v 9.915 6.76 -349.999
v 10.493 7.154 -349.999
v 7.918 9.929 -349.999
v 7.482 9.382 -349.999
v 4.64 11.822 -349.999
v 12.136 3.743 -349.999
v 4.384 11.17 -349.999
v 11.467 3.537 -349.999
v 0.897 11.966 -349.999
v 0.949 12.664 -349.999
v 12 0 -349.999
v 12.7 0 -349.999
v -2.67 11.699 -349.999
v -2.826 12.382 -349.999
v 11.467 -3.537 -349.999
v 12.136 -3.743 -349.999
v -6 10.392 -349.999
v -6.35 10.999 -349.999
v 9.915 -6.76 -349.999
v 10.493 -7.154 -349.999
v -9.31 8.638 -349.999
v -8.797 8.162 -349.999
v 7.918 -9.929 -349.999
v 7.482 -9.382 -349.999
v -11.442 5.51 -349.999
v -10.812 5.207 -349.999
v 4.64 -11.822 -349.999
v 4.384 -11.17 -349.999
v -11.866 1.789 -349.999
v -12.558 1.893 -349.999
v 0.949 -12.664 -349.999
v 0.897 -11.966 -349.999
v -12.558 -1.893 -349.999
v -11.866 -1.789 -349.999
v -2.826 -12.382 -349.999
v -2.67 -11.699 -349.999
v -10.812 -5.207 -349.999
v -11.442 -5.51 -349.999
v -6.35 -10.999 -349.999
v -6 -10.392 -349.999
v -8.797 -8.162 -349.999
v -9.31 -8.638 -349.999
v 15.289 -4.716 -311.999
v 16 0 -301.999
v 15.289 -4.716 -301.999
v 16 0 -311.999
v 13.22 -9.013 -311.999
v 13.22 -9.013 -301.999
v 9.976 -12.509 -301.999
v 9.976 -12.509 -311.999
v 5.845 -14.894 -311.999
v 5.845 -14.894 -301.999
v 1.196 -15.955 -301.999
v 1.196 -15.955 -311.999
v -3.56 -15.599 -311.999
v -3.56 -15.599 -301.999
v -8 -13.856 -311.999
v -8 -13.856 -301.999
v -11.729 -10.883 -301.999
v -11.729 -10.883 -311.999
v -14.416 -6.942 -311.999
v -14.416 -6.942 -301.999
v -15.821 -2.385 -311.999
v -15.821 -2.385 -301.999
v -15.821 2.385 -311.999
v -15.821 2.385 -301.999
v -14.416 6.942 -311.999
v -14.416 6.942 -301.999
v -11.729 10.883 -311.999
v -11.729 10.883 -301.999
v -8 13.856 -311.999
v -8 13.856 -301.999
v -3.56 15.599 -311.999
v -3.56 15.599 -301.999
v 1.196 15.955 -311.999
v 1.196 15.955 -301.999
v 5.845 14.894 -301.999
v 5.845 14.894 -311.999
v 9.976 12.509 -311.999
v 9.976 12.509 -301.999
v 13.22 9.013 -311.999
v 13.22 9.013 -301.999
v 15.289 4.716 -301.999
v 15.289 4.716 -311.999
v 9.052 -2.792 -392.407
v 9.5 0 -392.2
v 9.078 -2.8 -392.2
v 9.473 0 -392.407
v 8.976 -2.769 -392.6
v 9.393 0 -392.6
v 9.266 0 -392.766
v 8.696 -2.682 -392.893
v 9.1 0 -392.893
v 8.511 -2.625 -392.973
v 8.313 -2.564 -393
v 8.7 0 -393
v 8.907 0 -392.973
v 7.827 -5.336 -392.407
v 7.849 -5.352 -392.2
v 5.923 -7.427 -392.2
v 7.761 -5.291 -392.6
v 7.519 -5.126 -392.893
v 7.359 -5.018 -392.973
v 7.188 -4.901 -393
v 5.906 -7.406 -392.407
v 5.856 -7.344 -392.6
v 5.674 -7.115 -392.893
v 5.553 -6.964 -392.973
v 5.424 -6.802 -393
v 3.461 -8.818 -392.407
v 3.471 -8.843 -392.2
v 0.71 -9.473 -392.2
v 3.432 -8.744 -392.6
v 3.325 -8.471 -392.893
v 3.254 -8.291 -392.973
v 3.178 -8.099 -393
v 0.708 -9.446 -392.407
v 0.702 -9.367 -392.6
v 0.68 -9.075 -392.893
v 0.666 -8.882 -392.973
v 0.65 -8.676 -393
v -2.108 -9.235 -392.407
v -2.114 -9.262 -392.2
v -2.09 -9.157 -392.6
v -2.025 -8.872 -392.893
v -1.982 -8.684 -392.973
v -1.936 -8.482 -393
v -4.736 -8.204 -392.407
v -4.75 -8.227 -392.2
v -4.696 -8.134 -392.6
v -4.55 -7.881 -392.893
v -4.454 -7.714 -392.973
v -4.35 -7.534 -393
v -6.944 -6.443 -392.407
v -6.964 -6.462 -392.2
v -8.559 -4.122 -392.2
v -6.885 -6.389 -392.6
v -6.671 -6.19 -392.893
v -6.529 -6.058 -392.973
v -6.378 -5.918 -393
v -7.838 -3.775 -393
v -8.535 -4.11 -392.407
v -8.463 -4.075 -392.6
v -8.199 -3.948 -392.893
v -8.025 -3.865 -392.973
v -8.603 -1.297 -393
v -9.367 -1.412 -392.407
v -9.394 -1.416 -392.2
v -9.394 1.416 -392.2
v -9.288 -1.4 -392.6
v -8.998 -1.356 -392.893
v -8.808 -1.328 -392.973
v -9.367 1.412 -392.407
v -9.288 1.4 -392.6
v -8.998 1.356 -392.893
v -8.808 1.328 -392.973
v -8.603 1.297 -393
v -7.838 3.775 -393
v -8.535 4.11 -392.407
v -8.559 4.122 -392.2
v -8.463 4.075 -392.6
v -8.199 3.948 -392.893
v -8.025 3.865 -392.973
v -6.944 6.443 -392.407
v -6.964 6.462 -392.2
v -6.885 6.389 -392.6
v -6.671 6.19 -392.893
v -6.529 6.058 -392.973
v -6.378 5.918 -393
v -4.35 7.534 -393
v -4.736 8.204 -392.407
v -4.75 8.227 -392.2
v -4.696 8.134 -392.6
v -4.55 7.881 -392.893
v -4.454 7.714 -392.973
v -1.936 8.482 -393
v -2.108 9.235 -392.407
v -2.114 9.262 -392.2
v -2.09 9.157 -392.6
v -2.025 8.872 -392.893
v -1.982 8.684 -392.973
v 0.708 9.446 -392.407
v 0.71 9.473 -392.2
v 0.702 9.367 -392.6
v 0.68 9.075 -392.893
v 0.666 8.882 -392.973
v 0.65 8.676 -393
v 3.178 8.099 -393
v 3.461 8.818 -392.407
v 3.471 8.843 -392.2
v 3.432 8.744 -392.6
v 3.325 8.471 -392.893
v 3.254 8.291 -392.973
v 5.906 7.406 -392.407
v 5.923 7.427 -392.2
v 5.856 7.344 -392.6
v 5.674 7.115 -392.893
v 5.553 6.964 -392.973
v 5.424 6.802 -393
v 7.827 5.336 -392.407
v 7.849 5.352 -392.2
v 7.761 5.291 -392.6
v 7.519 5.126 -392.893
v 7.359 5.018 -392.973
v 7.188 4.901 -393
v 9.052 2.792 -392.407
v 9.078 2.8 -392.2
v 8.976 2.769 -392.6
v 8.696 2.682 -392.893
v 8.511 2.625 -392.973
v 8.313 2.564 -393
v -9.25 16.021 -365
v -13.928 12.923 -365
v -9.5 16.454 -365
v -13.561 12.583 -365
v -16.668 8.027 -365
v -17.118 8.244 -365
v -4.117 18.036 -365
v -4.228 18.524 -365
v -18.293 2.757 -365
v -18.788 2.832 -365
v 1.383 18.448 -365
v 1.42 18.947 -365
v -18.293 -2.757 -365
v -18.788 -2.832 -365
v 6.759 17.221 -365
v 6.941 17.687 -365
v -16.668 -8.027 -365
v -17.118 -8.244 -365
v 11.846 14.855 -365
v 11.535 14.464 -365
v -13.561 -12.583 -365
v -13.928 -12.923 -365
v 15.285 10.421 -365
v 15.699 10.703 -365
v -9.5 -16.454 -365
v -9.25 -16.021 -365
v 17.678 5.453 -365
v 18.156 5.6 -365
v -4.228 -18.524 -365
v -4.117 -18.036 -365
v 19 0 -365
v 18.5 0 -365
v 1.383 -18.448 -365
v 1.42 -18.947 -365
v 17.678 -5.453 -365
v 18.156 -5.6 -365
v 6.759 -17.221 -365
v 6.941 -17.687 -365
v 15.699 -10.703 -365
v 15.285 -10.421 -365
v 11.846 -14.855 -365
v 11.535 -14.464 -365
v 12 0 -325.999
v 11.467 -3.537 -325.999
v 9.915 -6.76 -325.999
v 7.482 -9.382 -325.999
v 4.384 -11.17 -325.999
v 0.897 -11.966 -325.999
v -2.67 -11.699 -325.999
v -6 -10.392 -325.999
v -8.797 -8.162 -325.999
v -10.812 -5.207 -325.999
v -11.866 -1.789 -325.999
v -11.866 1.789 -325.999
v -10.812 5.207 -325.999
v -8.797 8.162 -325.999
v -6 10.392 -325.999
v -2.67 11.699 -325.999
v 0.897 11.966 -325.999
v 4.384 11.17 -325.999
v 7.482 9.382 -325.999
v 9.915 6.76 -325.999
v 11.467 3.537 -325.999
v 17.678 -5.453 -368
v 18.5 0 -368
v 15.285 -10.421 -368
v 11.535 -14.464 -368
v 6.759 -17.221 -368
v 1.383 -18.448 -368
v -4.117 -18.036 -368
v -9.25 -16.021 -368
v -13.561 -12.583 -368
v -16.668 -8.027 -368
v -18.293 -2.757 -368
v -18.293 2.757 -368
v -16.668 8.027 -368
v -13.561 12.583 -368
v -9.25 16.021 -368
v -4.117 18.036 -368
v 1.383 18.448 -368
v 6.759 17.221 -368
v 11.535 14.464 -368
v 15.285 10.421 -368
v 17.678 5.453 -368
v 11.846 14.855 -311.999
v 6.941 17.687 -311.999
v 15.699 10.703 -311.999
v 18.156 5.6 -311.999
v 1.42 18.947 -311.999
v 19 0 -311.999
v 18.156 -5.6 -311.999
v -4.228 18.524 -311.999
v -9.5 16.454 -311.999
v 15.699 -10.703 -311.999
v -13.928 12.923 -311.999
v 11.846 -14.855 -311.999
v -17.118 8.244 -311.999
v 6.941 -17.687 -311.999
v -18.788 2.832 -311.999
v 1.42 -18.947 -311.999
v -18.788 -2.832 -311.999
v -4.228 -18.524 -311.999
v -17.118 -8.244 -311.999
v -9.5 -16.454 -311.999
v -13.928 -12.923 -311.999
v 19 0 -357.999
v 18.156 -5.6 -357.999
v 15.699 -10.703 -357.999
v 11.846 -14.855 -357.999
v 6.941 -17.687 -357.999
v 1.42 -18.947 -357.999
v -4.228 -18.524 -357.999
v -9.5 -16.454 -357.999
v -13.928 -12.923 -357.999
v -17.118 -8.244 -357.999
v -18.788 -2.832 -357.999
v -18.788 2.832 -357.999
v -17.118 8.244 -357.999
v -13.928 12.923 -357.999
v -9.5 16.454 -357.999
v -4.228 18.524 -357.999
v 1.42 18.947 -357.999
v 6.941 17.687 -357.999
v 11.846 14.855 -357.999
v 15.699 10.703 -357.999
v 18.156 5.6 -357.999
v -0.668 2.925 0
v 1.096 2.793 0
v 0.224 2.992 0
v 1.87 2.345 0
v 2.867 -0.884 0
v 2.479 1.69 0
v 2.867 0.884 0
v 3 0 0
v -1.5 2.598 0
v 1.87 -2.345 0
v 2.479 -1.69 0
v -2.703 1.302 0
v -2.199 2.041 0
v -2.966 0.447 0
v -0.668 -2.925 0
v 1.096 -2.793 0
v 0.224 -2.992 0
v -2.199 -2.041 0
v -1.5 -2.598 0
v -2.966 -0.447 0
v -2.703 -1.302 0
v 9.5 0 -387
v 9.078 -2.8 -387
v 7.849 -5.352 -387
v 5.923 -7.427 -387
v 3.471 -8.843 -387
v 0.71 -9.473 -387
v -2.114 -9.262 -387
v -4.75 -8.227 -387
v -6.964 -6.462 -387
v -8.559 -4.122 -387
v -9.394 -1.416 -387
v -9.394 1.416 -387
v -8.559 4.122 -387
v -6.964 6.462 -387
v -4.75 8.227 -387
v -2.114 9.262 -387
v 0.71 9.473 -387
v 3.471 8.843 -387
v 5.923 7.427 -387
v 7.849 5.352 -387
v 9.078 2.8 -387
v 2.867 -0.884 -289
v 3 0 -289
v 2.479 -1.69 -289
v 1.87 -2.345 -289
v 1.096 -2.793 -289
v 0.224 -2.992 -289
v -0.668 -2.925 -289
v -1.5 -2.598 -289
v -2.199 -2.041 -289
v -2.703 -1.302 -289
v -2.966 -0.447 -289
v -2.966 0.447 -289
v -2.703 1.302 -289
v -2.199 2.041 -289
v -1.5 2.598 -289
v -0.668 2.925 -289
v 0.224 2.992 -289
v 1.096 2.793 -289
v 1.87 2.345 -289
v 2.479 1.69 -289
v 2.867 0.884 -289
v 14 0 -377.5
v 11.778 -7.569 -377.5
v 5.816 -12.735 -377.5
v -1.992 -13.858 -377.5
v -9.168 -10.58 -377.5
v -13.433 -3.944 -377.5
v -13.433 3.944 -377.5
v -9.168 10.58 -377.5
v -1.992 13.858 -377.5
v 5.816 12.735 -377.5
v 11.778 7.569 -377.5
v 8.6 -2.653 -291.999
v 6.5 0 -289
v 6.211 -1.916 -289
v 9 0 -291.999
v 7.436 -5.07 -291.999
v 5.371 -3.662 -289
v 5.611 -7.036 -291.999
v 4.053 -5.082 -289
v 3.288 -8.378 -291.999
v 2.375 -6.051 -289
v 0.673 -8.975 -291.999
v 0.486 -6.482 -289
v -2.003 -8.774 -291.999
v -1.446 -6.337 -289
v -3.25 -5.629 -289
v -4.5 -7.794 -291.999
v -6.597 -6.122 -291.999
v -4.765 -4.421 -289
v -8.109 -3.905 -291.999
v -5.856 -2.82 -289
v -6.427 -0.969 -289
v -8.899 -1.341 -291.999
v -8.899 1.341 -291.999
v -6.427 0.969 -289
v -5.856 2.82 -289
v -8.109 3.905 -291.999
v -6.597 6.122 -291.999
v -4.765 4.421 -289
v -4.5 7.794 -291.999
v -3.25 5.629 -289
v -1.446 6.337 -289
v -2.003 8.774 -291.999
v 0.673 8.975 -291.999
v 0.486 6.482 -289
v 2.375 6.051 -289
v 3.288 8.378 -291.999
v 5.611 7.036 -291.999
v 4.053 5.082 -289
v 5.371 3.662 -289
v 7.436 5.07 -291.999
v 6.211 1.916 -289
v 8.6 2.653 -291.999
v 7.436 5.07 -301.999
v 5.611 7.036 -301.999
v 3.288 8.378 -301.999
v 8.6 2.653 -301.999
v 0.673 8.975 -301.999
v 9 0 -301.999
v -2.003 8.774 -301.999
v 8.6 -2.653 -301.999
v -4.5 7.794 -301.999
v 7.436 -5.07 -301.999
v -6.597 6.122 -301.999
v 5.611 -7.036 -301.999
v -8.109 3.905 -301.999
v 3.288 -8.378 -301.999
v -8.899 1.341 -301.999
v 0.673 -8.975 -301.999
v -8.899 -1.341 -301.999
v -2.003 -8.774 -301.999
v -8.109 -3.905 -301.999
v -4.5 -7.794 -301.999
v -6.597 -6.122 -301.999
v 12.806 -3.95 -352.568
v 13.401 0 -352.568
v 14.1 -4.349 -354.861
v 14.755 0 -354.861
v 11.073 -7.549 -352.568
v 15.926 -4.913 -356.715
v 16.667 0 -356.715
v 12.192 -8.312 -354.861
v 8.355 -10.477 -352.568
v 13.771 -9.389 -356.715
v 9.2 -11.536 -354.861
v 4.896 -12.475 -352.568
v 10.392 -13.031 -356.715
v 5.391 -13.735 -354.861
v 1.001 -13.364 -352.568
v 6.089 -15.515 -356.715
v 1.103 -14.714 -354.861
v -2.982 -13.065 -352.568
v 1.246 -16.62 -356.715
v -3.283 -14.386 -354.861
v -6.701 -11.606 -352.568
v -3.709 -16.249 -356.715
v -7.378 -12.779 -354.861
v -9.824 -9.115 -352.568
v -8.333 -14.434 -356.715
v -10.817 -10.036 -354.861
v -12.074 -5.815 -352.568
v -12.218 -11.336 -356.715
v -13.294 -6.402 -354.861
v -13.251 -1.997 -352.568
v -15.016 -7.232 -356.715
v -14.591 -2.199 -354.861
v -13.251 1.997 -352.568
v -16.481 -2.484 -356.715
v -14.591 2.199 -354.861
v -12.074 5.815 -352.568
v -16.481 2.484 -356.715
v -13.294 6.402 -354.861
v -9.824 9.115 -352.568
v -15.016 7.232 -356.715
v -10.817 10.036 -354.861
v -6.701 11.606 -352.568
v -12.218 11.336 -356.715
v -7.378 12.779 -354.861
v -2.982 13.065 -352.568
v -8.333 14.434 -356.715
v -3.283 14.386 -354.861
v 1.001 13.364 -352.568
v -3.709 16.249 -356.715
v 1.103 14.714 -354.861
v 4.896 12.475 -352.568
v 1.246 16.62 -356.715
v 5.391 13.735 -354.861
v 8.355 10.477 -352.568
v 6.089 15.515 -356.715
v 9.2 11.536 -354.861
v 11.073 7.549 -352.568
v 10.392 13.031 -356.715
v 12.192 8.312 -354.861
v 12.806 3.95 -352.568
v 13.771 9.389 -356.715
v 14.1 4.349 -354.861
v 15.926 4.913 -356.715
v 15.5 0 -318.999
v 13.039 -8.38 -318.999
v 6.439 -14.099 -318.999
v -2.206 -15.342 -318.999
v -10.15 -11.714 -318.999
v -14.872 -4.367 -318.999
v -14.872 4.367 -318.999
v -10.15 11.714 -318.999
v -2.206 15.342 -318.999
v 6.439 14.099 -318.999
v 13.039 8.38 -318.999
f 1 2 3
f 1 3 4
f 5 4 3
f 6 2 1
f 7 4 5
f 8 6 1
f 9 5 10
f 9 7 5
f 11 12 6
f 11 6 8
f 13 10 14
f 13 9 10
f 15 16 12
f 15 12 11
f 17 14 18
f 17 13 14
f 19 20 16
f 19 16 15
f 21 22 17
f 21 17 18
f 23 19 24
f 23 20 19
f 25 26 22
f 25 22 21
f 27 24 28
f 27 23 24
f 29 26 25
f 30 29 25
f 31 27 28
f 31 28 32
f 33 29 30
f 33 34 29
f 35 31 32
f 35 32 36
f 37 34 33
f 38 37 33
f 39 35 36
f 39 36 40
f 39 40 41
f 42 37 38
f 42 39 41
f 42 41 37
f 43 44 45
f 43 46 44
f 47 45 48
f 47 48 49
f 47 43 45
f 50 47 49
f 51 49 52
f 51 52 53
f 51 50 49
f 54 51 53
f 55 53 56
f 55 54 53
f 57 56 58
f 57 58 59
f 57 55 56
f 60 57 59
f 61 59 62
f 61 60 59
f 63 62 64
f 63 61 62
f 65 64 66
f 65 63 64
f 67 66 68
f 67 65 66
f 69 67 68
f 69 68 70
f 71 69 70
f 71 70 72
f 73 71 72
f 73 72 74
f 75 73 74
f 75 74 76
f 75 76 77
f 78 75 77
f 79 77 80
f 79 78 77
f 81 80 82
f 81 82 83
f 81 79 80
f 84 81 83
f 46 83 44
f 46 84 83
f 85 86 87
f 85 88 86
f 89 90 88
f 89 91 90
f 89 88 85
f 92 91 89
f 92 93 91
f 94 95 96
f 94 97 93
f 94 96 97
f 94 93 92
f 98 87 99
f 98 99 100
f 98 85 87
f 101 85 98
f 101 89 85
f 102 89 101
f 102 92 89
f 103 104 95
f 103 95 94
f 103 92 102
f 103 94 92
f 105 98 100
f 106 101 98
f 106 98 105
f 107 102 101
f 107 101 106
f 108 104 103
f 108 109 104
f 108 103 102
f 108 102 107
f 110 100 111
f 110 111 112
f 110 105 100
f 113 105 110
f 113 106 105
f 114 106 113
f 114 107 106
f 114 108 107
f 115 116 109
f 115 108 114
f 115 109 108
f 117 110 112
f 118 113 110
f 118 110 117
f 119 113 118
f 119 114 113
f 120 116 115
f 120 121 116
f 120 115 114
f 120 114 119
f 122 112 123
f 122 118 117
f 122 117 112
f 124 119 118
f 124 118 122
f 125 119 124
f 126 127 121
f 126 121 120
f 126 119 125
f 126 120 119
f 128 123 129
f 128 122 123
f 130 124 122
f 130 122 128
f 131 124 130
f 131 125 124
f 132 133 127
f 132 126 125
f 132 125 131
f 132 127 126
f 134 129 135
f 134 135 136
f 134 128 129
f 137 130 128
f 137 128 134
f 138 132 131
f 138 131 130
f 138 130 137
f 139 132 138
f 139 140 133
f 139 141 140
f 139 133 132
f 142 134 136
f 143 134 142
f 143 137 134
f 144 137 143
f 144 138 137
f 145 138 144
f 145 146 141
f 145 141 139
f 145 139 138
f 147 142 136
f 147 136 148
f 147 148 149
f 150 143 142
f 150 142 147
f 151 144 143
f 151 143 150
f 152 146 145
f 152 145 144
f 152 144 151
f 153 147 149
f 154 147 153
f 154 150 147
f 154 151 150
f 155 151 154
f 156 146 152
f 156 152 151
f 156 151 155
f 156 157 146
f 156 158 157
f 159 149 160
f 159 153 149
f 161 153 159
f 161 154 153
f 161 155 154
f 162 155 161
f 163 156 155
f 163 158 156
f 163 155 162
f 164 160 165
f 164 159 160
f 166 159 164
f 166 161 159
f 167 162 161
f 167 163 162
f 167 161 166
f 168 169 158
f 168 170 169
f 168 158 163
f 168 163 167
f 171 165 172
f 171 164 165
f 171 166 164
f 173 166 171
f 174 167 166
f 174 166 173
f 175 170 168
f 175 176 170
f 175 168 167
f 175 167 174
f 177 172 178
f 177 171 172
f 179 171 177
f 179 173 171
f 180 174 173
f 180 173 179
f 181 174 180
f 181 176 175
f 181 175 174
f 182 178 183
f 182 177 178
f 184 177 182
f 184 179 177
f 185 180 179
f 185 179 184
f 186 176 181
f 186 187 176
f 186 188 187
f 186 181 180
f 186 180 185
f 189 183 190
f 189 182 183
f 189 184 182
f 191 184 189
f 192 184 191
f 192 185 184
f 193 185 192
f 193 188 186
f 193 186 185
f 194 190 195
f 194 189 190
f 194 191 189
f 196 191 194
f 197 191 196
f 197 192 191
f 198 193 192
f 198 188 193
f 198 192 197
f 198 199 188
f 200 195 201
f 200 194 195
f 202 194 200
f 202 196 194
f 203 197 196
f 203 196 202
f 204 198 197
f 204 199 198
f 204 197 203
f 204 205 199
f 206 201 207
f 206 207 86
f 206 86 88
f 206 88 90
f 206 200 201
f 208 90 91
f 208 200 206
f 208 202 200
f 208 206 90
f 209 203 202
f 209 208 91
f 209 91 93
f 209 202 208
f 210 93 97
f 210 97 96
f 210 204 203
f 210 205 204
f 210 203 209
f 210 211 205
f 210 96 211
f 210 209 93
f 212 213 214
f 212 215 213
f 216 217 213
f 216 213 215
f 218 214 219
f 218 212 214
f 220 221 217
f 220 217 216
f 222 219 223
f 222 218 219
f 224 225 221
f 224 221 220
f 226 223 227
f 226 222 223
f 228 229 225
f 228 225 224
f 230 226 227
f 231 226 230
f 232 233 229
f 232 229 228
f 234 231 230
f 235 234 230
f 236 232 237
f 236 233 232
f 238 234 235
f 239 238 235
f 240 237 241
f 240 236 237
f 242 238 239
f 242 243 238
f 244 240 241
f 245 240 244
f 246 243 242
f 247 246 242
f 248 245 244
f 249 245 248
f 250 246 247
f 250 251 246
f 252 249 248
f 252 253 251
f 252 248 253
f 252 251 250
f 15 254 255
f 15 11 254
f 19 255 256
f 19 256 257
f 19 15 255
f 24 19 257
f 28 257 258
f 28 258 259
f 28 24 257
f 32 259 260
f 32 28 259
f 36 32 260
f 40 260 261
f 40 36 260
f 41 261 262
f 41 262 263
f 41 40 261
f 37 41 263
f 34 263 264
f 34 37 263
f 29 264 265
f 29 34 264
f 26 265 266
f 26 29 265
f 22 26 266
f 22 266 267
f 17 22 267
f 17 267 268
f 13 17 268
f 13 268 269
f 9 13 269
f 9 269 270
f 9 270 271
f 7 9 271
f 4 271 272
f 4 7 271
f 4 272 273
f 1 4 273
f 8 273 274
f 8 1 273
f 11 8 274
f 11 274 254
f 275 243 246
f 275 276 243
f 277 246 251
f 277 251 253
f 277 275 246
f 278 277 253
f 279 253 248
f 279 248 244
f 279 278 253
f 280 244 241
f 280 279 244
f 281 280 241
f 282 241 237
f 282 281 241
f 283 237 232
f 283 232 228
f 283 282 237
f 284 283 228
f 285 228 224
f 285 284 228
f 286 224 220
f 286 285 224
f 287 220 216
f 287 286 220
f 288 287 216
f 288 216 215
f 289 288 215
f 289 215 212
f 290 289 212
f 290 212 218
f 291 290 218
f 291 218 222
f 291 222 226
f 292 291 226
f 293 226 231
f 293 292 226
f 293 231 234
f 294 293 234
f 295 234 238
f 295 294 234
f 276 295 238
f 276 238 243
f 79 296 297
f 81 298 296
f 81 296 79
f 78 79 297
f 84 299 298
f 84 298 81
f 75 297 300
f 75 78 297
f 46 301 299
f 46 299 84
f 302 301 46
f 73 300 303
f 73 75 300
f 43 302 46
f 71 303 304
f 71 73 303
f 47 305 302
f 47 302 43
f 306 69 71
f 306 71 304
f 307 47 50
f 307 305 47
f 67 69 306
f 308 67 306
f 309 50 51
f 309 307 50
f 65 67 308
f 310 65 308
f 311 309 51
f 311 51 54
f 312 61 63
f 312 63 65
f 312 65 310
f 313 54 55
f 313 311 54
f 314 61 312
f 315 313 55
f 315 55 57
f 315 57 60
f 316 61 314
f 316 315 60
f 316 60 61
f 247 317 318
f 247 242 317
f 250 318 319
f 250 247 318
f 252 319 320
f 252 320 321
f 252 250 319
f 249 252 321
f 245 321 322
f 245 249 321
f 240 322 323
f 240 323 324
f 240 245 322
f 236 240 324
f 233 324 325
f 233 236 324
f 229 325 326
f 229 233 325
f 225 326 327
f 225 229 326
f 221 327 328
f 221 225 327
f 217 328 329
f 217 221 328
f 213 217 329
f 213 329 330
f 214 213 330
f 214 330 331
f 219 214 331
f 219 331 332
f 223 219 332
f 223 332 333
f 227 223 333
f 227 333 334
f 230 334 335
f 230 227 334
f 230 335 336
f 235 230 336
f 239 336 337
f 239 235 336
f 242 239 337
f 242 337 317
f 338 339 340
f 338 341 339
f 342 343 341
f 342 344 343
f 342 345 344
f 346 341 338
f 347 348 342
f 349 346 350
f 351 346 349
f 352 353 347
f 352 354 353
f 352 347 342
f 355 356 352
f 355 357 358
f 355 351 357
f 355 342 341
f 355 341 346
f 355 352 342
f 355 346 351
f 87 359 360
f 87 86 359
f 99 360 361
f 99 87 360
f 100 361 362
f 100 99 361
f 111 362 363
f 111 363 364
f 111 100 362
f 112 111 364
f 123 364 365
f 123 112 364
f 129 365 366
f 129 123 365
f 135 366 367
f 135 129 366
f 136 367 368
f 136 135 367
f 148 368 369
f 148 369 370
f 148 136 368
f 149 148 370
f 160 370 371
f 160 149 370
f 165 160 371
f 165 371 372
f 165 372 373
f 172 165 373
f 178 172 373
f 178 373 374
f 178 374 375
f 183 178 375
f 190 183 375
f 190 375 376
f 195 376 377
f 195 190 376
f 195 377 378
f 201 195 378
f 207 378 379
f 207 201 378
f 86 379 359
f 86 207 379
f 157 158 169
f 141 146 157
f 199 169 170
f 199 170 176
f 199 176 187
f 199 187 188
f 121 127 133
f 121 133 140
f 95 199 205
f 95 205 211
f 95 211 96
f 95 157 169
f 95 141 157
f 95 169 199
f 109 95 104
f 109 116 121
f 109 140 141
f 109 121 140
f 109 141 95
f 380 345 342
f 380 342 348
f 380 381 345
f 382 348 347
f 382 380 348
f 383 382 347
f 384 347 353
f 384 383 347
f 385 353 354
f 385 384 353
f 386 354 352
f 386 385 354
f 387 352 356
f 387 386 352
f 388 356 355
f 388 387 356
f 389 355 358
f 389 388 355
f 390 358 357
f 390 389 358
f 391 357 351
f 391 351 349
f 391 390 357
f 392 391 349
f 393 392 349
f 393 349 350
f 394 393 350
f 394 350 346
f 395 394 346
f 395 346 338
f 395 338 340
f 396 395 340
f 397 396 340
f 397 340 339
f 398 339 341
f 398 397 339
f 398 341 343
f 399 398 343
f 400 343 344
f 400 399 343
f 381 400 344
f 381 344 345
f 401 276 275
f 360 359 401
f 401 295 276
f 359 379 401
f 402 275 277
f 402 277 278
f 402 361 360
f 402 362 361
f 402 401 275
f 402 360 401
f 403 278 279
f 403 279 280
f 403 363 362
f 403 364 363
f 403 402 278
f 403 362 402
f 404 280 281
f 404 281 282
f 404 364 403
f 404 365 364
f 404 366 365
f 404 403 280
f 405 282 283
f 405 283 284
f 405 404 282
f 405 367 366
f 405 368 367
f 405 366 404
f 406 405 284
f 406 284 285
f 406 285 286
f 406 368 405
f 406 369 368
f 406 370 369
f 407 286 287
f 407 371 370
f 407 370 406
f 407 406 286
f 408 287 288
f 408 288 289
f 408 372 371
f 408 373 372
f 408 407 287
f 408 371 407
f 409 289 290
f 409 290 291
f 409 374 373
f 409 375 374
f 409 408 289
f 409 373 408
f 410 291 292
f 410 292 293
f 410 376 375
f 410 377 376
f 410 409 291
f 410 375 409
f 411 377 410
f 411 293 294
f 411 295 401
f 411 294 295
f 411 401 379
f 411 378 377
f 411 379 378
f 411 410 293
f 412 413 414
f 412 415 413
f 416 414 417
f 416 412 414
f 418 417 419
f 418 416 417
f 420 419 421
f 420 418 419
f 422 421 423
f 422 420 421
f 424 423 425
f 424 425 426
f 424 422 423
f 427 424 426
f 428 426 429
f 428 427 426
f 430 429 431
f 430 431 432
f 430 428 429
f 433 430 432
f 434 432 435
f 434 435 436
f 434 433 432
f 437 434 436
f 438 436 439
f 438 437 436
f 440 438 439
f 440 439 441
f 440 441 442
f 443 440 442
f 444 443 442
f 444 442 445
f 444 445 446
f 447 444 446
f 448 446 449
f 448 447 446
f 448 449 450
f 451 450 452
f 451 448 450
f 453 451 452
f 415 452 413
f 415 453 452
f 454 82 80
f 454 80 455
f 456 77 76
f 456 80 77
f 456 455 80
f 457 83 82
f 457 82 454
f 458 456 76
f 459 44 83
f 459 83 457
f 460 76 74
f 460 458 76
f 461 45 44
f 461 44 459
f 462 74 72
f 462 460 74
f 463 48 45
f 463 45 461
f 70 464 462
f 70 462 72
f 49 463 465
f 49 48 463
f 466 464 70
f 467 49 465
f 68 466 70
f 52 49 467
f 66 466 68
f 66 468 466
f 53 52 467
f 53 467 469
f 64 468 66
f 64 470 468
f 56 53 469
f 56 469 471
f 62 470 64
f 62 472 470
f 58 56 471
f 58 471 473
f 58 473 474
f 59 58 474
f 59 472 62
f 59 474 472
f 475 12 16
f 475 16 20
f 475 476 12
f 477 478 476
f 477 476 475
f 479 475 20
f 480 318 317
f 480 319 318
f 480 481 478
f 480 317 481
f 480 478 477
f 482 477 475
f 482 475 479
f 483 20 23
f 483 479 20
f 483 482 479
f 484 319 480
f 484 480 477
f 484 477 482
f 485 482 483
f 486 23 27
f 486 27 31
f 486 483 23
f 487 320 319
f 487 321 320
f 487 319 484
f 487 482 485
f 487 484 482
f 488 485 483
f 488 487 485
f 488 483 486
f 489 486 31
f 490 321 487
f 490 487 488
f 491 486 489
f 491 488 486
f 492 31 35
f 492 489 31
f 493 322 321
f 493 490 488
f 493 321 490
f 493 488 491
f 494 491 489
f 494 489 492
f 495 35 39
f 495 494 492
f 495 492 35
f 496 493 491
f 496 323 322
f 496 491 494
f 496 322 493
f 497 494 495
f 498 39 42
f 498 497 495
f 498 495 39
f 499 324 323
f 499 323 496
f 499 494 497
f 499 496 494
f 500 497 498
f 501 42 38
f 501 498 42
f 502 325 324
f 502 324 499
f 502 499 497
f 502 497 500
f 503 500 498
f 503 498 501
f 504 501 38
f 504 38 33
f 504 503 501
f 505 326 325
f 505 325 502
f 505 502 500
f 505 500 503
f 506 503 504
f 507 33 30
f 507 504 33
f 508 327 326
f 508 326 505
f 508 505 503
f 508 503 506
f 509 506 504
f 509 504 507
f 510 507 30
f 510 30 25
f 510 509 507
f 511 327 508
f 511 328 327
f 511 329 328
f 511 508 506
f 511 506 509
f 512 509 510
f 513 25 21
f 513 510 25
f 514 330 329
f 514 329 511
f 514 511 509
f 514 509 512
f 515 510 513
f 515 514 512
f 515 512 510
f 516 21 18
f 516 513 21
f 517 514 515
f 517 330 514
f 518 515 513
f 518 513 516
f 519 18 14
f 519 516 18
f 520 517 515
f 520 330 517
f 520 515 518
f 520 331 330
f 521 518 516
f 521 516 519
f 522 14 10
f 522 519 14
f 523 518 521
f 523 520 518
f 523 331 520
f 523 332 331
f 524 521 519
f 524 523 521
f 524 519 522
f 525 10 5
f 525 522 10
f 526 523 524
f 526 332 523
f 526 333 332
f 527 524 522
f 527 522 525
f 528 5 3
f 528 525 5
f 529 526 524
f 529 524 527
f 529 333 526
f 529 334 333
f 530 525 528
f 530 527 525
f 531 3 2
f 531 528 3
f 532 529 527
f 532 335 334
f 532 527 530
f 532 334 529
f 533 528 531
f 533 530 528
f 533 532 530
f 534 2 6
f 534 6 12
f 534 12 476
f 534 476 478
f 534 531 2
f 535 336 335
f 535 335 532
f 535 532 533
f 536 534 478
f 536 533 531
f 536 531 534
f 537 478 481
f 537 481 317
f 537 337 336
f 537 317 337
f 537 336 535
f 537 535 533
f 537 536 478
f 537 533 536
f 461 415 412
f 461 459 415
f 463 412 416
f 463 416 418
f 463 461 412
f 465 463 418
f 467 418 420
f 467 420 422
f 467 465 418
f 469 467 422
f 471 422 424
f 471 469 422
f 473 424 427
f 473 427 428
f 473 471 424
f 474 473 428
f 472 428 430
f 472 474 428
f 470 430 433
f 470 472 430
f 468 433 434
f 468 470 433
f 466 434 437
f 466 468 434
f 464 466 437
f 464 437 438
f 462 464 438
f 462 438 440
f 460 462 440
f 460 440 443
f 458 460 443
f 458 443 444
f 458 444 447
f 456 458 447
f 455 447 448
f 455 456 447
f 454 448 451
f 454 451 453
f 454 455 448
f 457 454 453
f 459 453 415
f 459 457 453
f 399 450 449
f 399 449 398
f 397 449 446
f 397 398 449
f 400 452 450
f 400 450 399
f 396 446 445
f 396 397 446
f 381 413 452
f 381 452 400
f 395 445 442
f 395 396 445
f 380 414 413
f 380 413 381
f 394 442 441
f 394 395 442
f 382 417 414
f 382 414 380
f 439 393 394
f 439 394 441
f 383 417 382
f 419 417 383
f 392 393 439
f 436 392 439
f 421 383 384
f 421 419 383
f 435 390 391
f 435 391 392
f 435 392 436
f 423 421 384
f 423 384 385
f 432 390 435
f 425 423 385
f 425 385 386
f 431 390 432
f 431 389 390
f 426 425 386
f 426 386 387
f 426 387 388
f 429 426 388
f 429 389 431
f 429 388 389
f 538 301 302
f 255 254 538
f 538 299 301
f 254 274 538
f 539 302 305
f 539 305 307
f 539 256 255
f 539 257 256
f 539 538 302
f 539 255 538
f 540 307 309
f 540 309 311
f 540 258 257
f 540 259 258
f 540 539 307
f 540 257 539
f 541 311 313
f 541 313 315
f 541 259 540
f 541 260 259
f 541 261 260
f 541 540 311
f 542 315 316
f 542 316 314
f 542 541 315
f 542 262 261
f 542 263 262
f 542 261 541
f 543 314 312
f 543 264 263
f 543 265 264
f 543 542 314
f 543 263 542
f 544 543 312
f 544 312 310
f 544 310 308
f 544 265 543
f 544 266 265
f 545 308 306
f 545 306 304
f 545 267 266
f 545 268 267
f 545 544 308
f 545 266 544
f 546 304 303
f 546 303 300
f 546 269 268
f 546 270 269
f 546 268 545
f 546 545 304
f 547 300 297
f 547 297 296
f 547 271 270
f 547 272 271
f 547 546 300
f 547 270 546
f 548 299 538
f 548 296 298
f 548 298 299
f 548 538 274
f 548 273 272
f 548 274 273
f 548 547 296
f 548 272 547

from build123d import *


with BuildPart() as part:
    # Эскиз1 → Повернуть1 (revolve)
    with BuildSketch(Plane(origin=(0, 0, 0), x_dir=(0, 0, -1), z_dir=(1, 0, 0)), mode=Mode.PRIVATE) as revolve_1_sk:
        with BuildLine():
            Line((0, 0), (0, 3))
            Line((0, 3), (289, 3))
            Line((289, 3), (289, 6.5))
            Line((289, 6.5), (291.999073931, 9))
            Line((291.999073931, 9), (301.999073931, 9))
            Line((301.999073931, 9), (301.999073931, 16))
            Line((301.999073931, 16), (311.999073931, 16))
            Line((311.999073931, 16), (311.999073931, 19))
            Line((311.999073931, 19), (325.999073931, 12))
            Line((325.999073931, 12), (349.999073931, 12))
            Line((349.999073931, 12), (349.999073931, 12.7))
            ThreePointArc((349.999073931, 12.7), (354.861013139, 14.755474022), (357.999073931, 19))
            Line((357.999073931, 19), (365, 19))
            Line((365, 19), (365, 18.5))
            Line((365, 18.5), (368, 18.5))
            Line((368, 18.5), (387, 9.5))
            Line((387, 9.5), (392.2, 9.5))
            ThreePointArc((392.2, 9.5), (392.765685425, 9.265685425), (393, 8.7))
            Line((393, 8.7), (393, 0))
            Line((393, 0), (0, 0))
        make_face()
    revolve(revolve_1_sk.sketch.rotate(Axis((0, 0, 0), (0, 0, -1)), 90), axis=Axis((0, 0, 0), (0, 0, -1)))


solid = part.part
